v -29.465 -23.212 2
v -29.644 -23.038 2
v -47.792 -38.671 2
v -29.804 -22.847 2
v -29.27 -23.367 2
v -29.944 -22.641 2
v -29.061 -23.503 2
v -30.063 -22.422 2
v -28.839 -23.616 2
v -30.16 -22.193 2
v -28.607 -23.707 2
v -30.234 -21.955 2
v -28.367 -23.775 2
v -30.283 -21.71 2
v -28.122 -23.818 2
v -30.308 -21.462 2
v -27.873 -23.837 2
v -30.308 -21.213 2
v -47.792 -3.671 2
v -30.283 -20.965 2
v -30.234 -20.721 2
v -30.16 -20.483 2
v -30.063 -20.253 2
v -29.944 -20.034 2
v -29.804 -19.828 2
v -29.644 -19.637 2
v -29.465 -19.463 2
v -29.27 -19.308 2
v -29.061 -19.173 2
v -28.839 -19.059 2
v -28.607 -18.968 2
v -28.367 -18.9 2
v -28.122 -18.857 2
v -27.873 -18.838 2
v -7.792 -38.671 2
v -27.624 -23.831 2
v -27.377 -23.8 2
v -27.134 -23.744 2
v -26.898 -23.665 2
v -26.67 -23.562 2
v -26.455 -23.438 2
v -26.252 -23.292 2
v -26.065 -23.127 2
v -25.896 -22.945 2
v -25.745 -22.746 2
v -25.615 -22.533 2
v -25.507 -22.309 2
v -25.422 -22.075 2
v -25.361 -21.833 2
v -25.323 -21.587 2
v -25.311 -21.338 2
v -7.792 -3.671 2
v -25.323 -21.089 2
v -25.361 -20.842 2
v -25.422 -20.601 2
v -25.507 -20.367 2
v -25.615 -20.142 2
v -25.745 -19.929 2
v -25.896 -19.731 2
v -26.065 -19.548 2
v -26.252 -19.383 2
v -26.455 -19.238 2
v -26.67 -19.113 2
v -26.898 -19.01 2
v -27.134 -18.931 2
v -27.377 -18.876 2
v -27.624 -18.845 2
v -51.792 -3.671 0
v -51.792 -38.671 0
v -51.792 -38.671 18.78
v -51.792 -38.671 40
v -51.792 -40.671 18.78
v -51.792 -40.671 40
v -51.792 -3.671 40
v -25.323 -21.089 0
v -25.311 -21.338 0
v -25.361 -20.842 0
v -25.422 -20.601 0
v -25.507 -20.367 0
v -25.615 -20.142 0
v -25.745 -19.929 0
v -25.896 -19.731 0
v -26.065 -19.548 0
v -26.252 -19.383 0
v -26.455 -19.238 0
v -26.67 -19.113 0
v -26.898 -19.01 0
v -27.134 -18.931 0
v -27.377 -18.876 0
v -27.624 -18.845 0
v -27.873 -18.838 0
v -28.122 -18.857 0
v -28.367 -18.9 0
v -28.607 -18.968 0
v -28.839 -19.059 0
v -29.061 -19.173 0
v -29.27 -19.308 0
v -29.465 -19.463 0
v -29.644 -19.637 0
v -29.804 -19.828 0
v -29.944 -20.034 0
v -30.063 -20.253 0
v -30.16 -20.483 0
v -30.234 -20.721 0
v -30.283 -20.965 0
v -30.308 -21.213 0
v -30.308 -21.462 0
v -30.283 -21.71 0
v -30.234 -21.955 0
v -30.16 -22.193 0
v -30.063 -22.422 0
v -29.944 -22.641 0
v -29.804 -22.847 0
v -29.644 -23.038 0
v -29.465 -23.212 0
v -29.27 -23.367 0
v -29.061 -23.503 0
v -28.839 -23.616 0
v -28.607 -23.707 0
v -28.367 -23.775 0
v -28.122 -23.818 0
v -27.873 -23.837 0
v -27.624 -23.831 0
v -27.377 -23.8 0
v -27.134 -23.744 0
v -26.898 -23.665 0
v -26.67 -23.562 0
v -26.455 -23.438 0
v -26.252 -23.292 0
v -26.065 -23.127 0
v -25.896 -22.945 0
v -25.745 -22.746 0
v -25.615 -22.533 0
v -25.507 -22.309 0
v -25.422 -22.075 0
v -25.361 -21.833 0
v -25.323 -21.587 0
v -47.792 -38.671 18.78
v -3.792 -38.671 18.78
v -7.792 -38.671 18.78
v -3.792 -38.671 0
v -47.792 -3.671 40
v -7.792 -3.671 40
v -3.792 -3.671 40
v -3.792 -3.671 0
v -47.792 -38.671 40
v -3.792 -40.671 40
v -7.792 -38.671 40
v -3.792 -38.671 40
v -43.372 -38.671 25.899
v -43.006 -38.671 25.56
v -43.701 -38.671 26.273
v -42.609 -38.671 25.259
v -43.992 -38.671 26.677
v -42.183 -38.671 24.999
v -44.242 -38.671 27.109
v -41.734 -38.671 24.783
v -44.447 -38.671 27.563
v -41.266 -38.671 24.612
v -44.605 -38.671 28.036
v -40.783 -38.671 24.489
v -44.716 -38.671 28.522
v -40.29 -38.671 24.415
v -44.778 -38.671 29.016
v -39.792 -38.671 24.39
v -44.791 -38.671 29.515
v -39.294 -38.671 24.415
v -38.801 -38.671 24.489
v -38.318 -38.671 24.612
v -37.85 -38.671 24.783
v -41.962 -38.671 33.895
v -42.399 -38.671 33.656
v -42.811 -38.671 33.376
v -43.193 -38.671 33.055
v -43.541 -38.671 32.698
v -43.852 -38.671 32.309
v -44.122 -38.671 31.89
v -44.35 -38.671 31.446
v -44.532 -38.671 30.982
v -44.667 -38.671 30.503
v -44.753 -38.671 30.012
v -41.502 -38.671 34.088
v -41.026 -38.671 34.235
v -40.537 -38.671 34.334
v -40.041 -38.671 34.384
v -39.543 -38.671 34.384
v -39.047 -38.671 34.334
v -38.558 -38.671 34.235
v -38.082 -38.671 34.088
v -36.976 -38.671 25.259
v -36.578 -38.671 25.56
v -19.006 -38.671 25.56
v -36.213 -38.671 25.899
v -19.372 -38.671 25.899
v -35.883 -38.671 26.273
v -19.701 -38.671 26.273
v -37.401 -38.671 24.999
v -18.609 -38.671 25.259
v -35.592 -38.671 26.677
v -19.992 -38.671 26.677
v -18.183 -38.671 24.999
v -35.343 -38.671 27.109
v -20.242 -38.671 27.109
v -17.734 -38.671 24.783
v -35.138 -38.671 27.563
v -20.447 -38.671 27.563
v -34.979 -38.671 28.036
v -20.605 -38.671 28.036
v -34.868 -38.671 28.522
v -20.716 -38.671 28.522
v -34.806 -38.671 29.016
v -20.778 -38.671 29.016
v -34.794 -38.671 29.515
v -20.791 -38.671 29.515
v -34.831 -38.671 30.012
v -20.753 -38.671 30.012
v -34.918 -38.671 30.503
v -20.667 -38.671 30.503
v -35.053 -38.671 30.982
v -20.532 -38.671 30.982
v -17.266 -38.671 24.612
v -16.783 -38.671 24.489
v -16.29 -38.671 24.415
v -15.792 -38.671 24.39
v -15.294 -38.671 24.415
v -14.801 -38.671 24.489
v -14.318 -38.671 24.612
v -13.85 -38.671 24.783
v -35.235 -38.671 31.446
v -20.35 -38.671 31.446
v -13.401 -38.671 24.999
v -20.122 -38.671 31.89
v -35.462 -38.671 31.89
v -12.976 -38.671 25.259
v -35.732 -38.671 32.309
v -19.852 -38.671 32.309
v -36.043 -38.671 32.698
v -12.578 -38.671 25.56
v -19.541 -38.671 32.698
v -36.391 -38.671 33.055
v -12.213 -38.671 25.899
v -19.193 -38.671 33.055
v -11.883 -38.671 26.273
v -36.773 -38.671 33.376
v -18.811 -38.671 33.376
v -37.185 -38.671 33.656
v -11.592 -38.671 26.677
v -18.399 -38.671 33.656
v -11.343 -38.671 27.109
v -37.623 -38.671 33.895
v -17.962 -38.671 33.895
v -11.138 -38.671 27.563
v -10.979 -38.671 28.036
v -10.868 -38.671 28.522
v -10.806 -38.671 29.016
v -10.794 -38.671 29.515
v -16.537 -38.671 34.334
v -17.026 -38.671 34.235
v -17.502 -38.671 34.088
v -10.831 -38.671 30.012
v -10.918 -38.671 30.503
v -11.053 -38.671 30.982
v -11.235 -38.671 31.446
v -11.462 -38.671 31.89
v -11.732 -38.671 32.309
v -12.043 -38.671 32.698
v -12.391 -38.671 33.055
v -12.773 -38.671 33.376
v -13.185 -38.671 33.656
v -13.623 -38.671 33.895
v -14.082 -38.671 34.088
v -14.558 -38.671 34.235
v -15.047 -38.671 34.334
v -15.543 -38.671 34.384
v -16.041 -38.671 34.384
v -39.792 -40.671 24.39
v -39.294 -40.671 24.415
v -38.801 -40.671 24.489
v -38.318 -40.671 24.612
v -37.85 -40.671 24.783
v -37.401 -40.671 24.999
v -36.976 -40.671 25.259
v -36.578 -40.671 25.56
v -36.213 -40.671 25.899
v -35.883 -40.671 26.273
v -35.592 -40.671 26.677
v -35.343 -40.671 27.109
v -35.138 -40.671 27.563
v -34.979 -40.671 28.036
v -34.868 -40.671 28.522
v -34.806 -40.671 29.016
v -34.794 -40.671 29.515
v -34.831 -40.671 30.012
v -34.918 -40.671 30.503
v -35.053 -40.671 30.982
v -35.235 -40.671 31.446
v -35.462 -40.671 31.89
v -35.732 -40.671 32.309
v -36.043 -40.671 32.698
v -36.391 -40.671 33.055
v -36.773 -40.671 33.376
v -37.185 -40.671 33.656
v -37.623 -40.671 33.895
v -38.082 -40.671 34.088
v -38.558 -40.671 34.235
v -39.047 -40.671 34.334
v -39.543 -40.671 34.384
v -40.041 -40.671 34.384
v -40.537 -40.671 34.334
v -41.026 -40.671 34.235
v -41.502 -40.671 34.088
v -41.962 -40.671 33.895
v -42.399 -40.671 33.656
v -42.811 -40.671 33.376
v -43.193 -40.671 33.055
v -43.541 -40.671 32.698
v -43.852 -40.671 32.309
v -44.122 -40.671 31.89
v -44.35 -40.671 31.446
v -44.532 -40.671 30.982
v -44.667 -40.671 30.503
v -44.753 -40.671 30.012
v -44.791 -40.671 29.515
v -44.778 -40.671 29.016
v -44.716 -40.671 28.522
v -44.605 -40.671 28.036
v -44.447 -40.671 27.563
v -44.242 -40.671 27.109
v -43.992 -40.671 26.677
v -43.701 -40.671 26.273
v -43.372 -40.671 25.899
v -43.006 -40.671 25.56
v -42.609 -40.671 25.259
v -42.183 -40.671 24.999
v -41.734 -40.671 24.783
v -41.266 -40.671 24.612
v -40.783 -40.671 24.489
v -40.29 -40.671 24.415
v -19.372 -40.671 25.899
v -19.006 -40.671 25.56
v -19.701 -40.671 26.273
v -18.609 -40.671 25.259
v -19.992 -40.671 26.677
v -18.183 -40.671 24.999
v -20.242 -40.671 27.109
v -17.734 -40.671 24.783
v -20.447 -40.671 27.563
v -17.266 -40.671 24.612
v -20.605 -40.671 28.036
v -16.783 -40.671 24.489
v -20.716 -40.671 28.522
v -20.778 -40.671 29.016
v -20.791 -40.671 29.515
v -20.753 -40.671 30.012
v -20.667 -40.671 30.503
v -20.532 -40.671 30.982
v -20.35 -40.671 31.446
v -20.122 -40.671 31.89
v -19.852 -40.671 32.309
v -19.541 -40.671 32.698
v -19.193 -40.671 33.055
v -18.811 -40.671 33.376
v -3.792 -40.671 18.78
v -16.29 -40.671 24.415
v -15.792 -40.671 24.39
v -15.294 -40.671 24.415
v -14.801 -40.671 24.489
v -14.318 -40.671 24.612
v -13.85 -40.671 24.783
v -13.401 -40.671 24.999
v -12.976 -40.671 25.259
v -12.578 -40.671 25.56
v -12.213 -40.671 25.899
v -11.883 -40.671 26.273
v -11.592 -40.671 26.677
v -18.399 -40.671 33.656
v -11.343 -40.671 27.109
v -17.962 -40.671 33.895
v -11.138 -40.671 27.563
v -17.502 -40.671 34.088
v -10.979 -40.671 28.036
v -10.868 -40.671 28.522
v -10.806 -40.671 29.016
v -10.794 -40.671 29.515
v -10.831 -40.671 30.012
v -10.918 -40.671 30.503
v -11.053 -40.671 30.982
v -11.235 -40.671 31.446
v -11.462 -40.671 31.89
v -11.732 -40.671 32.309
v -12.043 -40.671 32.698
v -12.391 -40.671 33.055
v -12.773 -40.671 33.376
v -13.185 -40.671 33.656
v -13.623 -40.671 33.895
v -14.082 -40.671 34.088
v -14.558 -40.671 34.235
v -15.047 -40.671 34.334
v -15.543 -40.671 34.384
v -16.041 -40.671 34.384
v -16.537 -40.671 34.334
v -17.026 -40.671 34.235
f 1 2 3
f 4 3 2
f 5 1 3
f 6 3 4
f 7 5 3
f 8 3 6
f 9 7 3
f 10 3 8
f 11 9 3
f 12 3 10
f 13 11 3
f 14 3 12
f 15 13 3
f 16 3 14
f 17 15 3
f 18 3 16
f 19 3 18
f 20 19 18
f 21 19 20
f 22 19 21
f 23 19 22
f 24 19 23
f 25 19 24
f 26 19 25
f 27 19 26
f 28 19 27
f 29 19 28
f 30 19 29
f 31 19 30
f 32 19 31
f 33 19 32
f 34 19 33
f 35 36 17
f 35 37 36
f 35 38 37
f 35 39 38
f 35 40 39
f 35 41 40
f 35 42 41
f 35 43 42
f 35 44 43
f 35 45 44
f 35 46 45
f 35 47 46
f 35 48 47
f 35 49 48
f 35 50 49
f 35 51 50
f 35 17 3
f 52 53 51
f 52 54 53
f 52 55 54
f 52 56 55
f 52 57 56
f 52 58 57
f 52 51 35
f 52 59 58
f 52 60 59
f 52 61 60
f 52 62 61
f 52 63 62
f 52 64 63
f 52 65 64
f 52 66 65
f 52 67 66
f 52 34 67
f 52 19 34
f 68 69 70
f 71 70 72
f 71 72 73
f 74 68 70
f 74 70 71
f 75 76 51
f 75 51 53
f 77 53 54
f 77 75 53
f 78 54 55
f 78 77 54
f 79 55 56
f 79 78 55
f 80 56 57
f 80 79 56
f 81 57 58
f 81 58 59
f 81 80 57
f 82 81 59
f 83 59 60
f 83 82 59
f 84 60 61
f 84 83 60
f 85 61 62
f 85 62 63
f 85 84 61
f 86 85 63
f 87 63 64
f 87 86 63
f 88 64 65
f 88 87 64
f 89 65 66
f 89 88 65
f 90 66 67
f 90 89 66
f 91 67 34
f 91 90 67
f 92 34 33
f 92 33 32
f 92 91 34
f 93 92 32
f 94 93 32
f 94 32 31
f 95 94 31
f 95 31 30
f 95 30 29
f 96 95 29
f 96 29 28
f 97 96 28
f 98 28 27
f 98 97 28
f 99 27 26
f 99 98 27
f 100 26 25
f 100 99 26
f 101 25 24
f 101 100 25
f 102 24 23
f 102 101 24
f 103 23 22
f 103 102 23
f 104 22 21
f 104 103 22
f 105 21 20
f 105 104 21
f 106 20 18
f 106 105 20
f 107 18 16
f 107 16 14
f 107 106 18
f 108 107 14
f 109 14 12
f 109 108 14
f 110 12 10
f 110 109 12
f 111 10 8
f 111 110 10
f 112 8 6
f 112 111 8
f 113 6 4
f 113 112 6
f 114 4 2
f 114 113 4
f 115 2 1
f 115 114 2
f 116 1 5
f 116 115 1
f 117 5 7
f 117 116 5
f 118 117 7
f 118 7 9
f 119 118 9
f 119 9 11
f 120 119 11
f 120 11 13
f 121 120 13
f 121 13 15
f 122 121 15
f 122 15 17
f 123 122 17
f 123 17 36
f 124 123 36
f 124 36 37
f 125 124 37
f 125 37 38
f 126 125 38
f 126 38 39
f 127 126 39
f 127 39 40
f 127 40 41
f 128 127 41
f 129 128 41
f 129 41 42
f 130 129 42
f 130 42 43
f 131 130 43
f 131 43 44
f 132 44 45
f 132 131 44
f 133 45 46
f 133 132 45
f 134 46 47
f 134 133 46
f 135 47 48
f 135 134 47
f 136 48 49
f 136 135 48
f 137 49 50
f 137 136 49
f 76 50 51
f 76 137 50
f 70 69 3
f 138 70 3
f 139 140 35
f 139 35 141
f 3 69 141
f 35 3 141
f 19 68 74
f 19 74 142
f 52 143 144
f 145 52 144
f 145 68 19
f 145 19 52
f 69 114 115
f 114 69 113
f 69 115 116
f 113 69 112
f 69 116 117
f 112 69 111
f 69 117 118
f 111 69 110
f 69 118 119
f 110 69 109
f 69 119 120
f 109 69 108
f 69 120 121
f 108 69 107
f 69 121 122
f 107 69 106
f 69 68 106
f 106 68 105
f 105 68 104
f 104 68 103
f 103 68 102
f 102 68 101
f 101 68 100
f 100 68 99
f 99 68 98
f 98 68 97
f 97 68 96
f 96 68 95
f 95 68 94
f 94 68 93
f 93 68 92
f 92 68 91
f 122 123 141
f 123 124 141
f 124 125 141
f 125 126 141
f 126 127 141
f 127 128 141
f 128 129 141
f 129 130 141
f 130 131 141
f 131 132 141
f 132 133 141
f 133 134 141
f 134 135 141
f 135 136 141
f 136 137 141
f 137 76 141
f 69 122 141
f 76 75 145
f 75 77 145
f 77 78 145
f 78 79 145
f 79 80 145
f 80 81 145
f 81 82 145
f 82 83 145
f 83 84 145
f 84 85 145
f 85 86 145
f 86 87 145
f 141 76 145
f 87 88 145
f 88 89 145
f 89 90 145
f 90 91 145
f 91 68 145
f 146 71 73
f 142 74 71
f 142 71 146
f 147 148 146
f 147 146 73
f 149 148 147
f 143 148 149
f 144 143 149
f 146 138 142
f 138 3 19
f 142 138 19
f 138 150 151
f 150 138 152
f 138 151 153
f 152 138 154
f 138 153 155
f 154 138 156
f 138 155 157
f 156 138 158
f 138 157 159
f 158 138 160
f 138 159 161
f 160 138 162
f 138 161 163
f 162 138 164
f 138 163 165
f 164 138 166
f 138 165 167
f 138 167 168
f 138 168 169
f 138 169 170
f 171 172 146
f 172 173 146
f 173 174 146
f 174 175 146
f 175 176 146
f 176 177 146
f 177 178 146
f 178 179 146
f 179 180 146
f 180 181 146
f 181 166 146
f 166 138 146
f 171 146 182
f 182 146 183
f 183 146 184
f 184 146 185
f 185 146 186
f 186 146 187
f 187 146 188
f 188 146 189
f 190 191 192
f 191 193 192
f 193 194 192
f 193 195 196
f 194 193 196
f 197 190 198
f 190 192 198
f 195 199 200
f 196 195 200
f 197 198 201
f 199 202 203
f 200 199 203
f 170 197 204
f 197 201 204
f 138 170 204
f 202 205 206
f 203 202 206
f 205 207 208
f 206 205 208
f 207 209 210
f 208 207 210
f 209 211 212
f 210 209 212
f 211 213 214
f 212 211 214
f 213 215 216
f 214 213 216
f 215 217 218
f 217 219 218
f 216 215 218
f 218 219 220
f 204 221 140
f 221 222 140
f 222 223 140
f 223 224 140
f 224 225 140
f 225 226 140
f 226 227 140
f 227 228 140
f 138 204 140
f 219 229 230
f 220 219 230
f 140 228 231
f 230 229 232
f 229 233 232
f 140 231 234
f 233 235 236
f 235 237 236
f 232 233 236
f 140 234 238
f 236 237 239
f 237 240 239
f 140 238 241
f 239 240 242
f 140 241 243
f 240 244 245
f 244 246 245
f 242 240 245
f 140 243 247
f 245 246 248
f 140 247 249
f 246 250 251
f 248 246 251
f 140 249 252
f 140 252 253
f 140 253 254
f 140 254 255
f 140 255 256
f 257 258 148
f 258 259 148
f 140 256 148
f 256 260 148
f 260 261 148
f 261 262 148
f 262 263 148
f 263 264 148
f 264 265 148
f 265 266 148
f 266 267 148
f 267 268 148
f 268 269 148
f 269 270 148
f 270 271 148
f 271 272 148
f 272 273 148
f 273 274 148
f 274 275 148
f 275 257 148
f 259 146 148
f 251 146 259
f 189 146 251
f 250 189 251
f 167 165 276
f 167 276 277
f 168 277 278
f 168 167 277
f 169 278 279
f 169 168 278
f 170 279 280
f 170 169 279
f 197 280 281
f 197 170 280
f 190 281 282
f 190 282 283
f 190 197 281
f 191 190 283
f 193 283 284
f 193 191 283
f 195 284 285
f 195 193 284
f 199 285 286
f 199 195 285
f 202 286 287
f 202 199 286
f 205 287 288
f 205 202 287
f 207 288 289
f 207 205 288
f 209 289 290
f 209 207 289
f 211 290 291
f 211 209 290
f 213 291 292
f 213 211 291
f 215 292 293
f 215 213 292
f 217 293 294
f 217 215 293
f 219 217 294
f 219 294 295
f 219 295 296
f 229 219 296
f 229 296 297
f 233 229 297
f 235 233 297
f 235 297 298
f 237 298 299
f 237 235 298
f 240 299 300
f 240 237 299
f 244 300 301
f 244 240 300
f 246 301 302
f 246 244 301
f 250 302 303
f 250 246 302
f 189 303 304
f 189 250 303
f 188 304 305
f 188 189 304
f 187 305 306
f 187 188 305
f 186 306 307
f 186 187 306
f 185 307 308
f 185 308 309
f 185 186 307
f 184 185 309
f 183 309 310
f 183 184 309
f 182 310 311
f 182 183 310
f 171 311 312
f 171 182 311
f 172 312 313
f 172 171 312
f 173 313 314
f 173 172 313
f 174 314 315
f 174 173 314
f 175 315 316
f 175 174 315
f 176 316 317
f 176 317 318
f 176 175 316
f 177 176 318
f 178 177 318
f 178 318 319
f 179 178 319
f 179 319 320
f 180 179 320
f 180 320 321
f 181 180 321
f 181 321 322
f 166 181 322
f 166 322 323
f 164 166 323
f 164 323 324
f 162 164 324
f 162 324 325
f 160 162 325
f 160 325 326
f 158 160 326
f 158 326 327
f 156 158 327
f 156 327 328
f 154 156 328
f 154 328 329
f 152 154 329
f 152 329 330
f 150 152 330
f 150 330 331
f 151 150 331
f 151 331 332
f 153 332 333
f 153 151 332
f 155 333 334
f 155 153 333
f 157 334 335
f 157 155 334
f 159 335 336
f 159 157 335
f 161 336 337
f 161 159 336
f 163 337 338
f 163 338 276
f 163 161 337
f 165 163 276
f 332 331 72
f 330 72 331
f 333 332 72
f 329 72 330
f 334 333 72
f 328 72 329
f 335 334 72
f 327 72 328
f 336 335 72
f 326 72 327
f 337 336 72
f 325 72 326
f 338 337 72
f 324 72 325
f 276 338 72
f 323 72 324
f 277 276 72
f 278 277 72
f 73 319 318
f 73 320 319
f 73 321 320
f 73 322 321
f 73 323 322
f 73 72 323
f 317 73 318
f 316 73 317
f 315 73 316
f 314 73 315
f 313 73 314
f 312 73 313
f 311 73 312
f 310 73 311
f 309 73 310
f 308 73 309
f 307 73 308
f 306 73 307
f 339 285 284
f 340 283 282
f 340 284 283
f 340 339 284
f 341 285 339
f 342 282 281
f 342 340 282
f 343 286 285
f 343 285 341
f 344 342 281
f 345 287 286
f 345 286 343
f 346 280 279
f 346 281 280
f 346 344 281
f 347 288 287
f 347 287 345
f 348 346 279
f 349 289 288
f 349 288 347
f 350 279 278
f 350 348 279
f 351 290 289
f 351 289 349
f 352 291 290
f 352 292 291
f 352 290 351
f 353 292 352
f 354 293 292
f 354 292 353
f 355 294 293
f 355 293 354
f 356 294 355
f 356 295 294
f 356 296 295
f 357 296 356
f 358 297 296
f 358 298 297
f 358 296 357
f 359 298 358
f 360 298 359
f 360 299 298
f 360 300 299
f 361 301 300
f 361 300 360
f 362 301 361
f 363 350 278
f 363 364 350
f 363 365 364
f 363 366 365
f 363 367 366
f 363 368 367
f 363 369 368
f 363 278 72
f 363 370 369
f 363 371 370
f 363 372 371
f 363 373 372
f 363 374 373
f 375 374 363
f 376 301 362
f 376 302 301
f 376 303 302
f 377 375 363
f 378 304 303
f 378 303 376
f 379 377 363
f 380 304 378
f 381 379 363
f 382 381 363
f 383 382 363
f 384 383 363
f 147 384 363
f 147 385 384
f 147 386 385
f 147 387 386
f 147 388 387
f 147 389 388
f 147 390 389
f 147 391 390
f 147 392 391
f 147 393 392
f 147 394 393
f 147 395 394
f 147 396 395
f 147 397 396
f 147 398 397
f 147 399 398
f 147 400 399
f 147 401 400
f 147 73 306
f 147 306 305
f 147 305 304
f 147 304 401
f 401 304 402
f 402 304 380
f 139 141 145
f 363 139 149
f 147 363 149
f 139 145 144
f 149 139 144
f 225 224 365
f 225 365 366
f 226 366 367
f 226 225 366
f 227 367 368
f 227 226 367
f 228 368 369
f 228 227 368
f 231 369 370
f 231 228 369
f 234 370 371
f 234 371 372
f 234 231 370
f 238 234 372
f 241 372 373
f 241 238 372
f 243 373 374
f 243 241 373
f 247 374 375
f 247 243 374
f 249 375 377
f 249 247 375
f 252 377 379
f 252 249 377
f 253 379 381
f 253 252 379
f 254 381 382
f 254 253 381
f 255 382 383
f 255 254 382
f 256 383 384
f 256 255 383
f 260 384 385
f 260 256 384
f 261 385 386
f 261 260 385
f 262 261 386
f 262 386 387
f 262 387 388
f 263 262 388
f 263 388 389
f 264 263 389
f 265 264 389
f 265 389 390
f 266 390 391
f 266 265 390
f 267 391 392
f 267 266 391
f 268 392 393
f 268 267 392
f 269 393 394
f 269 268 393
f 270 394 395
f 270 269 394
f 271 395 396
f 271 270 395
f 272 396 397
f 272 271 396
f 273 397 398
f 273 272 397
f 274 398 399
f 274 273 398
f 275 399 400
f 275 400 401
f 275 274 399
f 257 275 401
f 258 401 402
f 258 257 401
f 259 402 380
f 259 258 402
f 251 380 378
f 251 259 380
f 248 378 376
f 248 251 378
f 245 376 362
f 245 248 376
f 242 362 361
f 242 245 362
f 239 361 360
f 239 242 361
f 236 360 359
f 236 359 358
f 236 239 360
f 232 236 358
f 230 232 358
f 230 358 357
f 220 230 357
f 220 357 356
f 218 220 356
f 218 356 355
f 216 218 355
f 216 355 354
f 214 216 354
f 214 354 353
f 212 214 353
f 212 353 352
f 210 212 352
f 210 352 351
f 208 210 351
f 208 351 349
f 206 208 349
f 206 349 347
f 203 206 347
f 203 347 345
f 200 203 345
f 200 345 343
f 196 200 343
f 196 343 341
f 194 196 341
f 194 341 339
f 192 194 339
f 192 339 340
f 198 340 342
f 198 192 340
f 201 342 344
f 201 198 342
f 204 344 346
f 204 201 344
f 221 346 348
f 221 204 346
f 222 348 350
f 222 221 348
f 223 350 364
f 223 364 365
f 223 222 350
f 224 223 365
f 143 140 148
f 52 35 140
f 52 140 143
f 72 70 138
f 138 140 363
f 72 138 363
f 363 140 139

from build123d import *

# Parameters (mm, degrees)
ESBO_O1_W                = 48
ESBO_O1_H                = 35
ESBO_O1_R                = 2.5
RESSALTO_EXTRUS_O1_DEPTH = 2
ESBO_O2_W                = 4
ESBO_O2_H                = 35
RESSALTO_EXTRUS_O2_DEPTH = 38
ESBO_O3_W                = 48
ESBO_O3_H                = 21.220088249
ESBO_O3_R                = 5
RESSALTO_EXTRUS_O3_DEPTH = 2


with BuildPart() as part:
    # Esboço1 → Ressalto-extrusão1 (new body)
    with BuildSketch(Plane.XY):
        with Locations((-27.792174024, -21.17139219)):
            Rectangle(ESBO_O1_W, ESBO_O1_H)
        with Locations((-27.810949966, -21.337629256)):
            Circle(ESBO_O1_R, mode=Mode.SUBTRACT)
    extrude(amount=RESSALTO_EXTRUS_O1_DEPTH)

    # Esboço2 → Ressalto-extrusão2 (add)
    with BuildSketch(Plane.XY.offset(2)):
        with Locations((-49.792174024, -21.17139219)):
            Rectangle(ESBO_O2_W, ESBO_O2_H)
        with Locations((-5.792174024, -21.17139219)):
            Rectangle(ESBO_O2_W, ESBO_O2_H)
    extrude(amount=RESSALTO_EXTRUS_O2_DEPTH)

    # Esboço3 → Ressalto-extrusão3 (add)
    with BuildSketch(Plane.XZ.offset(38.67139219)):
        with Locations((-27.792174024, 29.389955876)):
            Rectangle(ESBO_O3_W, ESBO_O3_H)
        with Locations(Location((-39.792174024, 29.389955876, 0), (0, 0, 270))):
            Circle(ESBO_O3_R, mode=Mode.SUBTRACT)
        with Locations(Location((-15.792174024, 29.389955876, 0), (0, 0, 270))):
            Circle(ESBO_O3_R, mode=Mode.SUBTRACT)
    extrude(amount=RESSALTO_EXTRUS_O3_DEPTH)


solid = part.part
